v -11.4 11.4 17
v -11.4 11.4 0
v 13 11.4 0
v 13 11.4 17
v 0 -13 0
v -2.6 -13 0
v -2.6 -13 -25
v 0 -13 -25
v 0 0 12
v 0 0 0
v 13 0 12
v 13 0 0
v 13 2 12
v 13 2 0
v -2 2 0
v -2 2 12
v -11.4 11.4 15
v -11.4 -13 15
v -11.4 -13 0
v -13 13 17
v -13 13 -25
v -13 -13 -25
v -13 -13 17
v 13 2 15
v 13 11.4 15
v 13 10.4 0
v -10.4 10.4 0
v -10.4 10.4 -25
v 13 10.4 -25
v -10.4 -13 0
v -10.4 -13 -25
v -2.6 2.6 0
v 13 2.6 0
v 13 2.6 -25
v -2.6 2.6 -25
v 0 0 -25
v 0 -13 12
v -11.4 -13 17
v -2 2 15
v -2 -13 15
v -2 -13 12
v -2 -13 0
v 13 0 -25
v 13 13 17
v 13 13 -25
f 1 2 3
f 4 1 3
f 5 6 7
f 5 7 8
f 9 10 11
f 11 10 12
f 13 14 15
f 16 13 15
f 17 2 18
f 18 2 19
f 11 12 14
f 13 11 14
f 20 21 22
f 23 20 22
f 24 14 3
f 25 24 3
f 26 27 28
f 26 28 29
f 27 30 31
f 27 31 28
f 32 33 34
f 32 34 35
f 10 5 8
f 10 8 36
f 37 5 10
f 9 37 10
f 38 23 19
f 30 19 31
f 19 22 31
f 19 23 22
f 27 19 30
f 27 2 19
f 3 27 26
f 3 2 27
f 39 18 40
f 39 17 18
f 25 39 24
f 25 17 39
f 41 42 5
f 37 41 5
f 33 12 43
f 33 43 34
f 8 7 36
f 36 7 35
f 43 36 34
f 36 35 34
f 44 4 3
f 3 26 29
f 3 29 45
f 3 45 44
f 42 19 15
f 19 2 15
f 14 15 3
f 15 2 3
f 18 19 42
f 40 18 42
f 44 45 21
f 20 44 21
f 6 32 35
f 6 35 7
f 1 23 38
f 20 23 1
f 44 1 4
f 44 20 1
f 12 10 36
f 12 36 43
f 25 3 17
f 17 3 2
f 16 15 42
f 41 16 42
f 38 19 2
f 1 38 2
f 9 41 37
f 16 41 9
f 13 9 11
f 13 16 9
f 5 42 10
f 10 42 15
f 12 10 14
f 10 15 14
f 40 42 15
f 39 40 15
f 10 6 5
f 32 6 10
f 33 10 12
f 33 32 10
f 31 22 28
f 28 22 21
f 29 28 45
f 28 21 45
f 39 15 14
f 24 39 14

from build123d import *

# Parameters (mm, degrees)
F1_DEPTH = 25
F2_DEPTH = 17
F3_DEPTH = 15
F4_DEPTH = 12


with BuildPart() as f1:
    # F0 (on Top) → F1 (new body)
    with BuildSketch(Plane.XY):
        Polygon((-11.4, -13), (-10.4, -13), (-10.4, 0), (-10.4, 10.4), (0, 10.4), (13, 10.4), (13, 11.4), (0, 11.4), (-11.4, 11.4), (-11.4, 0), align=None)
        Polygon((-13, -13), (-11.4, -13), (-11.4, 0), (-11.4, 11.4), (0, 11.4), (13, 11.4), (13, 13), (0, 13), (-13, 13), (-13, 0), align=None)
        Polygon((-2.6, -13), (-2, -13), (-2, 2), (13, 2), (13, 2.6), (-2.6, 2.6), align=None)
        Polygon((-2, -13), (0, -13), (0, 0), (13, 0), (13, 2), (-2, 2), align=None)
    extrude(amount=-F1_DEPTH)

    # F0 (on Top) → F2 (join)
    with BuildSketch(Plane.XY):
        Polygon((-13, -13), (-11.4, -13), (-11.4, 0), (-11.4, 11.4), (0, 11.4), (13, 11.4), (13, 13), (0, 13), (-13, 13), (-13, 0), align=None)
    extrude(amount=F2_DEPTH)


with BuildPart() as f3:
    # F0 (on Top) → F3 (new body)
    with BuildSketch(Plane.XY):
        Polygon((-11.4, -13), (-10.4, -13), (-10.4, 0), (-10.4, 10.4), (0, 10.4), (13, 10.4), (13, 11.4), (0, 11.4), (-11.4, 11.4), (-11.4, 0), align=None)
        Polygon((-10.4, -13), (-2.6, -13), (-2.6, 2.6), (13, 2.6), (13, 10.4), (0, 10.4), (-10.4, 10.4), (-10.4, 0), align=None)
        Polygon((-2.6, -13), (-2, -13), (-2, 2), (13, 2), (13, 2.6), (-2.6, 2.6), align=None)
    extrude(amount=F3_DEPTH)


with BuildPart() as f4:
    # F0 (on Top) → F4 (new body)
    with BuildSketch(Plane.XY):
        Polygon((-2, -13), (0, -13), (0, 0), (13, 0), (13, 2), (-2, 2), align=None)
    extrude(amount=F4_DEPTH)


solid = Compound([f1.part, f3.part, f4.part])
